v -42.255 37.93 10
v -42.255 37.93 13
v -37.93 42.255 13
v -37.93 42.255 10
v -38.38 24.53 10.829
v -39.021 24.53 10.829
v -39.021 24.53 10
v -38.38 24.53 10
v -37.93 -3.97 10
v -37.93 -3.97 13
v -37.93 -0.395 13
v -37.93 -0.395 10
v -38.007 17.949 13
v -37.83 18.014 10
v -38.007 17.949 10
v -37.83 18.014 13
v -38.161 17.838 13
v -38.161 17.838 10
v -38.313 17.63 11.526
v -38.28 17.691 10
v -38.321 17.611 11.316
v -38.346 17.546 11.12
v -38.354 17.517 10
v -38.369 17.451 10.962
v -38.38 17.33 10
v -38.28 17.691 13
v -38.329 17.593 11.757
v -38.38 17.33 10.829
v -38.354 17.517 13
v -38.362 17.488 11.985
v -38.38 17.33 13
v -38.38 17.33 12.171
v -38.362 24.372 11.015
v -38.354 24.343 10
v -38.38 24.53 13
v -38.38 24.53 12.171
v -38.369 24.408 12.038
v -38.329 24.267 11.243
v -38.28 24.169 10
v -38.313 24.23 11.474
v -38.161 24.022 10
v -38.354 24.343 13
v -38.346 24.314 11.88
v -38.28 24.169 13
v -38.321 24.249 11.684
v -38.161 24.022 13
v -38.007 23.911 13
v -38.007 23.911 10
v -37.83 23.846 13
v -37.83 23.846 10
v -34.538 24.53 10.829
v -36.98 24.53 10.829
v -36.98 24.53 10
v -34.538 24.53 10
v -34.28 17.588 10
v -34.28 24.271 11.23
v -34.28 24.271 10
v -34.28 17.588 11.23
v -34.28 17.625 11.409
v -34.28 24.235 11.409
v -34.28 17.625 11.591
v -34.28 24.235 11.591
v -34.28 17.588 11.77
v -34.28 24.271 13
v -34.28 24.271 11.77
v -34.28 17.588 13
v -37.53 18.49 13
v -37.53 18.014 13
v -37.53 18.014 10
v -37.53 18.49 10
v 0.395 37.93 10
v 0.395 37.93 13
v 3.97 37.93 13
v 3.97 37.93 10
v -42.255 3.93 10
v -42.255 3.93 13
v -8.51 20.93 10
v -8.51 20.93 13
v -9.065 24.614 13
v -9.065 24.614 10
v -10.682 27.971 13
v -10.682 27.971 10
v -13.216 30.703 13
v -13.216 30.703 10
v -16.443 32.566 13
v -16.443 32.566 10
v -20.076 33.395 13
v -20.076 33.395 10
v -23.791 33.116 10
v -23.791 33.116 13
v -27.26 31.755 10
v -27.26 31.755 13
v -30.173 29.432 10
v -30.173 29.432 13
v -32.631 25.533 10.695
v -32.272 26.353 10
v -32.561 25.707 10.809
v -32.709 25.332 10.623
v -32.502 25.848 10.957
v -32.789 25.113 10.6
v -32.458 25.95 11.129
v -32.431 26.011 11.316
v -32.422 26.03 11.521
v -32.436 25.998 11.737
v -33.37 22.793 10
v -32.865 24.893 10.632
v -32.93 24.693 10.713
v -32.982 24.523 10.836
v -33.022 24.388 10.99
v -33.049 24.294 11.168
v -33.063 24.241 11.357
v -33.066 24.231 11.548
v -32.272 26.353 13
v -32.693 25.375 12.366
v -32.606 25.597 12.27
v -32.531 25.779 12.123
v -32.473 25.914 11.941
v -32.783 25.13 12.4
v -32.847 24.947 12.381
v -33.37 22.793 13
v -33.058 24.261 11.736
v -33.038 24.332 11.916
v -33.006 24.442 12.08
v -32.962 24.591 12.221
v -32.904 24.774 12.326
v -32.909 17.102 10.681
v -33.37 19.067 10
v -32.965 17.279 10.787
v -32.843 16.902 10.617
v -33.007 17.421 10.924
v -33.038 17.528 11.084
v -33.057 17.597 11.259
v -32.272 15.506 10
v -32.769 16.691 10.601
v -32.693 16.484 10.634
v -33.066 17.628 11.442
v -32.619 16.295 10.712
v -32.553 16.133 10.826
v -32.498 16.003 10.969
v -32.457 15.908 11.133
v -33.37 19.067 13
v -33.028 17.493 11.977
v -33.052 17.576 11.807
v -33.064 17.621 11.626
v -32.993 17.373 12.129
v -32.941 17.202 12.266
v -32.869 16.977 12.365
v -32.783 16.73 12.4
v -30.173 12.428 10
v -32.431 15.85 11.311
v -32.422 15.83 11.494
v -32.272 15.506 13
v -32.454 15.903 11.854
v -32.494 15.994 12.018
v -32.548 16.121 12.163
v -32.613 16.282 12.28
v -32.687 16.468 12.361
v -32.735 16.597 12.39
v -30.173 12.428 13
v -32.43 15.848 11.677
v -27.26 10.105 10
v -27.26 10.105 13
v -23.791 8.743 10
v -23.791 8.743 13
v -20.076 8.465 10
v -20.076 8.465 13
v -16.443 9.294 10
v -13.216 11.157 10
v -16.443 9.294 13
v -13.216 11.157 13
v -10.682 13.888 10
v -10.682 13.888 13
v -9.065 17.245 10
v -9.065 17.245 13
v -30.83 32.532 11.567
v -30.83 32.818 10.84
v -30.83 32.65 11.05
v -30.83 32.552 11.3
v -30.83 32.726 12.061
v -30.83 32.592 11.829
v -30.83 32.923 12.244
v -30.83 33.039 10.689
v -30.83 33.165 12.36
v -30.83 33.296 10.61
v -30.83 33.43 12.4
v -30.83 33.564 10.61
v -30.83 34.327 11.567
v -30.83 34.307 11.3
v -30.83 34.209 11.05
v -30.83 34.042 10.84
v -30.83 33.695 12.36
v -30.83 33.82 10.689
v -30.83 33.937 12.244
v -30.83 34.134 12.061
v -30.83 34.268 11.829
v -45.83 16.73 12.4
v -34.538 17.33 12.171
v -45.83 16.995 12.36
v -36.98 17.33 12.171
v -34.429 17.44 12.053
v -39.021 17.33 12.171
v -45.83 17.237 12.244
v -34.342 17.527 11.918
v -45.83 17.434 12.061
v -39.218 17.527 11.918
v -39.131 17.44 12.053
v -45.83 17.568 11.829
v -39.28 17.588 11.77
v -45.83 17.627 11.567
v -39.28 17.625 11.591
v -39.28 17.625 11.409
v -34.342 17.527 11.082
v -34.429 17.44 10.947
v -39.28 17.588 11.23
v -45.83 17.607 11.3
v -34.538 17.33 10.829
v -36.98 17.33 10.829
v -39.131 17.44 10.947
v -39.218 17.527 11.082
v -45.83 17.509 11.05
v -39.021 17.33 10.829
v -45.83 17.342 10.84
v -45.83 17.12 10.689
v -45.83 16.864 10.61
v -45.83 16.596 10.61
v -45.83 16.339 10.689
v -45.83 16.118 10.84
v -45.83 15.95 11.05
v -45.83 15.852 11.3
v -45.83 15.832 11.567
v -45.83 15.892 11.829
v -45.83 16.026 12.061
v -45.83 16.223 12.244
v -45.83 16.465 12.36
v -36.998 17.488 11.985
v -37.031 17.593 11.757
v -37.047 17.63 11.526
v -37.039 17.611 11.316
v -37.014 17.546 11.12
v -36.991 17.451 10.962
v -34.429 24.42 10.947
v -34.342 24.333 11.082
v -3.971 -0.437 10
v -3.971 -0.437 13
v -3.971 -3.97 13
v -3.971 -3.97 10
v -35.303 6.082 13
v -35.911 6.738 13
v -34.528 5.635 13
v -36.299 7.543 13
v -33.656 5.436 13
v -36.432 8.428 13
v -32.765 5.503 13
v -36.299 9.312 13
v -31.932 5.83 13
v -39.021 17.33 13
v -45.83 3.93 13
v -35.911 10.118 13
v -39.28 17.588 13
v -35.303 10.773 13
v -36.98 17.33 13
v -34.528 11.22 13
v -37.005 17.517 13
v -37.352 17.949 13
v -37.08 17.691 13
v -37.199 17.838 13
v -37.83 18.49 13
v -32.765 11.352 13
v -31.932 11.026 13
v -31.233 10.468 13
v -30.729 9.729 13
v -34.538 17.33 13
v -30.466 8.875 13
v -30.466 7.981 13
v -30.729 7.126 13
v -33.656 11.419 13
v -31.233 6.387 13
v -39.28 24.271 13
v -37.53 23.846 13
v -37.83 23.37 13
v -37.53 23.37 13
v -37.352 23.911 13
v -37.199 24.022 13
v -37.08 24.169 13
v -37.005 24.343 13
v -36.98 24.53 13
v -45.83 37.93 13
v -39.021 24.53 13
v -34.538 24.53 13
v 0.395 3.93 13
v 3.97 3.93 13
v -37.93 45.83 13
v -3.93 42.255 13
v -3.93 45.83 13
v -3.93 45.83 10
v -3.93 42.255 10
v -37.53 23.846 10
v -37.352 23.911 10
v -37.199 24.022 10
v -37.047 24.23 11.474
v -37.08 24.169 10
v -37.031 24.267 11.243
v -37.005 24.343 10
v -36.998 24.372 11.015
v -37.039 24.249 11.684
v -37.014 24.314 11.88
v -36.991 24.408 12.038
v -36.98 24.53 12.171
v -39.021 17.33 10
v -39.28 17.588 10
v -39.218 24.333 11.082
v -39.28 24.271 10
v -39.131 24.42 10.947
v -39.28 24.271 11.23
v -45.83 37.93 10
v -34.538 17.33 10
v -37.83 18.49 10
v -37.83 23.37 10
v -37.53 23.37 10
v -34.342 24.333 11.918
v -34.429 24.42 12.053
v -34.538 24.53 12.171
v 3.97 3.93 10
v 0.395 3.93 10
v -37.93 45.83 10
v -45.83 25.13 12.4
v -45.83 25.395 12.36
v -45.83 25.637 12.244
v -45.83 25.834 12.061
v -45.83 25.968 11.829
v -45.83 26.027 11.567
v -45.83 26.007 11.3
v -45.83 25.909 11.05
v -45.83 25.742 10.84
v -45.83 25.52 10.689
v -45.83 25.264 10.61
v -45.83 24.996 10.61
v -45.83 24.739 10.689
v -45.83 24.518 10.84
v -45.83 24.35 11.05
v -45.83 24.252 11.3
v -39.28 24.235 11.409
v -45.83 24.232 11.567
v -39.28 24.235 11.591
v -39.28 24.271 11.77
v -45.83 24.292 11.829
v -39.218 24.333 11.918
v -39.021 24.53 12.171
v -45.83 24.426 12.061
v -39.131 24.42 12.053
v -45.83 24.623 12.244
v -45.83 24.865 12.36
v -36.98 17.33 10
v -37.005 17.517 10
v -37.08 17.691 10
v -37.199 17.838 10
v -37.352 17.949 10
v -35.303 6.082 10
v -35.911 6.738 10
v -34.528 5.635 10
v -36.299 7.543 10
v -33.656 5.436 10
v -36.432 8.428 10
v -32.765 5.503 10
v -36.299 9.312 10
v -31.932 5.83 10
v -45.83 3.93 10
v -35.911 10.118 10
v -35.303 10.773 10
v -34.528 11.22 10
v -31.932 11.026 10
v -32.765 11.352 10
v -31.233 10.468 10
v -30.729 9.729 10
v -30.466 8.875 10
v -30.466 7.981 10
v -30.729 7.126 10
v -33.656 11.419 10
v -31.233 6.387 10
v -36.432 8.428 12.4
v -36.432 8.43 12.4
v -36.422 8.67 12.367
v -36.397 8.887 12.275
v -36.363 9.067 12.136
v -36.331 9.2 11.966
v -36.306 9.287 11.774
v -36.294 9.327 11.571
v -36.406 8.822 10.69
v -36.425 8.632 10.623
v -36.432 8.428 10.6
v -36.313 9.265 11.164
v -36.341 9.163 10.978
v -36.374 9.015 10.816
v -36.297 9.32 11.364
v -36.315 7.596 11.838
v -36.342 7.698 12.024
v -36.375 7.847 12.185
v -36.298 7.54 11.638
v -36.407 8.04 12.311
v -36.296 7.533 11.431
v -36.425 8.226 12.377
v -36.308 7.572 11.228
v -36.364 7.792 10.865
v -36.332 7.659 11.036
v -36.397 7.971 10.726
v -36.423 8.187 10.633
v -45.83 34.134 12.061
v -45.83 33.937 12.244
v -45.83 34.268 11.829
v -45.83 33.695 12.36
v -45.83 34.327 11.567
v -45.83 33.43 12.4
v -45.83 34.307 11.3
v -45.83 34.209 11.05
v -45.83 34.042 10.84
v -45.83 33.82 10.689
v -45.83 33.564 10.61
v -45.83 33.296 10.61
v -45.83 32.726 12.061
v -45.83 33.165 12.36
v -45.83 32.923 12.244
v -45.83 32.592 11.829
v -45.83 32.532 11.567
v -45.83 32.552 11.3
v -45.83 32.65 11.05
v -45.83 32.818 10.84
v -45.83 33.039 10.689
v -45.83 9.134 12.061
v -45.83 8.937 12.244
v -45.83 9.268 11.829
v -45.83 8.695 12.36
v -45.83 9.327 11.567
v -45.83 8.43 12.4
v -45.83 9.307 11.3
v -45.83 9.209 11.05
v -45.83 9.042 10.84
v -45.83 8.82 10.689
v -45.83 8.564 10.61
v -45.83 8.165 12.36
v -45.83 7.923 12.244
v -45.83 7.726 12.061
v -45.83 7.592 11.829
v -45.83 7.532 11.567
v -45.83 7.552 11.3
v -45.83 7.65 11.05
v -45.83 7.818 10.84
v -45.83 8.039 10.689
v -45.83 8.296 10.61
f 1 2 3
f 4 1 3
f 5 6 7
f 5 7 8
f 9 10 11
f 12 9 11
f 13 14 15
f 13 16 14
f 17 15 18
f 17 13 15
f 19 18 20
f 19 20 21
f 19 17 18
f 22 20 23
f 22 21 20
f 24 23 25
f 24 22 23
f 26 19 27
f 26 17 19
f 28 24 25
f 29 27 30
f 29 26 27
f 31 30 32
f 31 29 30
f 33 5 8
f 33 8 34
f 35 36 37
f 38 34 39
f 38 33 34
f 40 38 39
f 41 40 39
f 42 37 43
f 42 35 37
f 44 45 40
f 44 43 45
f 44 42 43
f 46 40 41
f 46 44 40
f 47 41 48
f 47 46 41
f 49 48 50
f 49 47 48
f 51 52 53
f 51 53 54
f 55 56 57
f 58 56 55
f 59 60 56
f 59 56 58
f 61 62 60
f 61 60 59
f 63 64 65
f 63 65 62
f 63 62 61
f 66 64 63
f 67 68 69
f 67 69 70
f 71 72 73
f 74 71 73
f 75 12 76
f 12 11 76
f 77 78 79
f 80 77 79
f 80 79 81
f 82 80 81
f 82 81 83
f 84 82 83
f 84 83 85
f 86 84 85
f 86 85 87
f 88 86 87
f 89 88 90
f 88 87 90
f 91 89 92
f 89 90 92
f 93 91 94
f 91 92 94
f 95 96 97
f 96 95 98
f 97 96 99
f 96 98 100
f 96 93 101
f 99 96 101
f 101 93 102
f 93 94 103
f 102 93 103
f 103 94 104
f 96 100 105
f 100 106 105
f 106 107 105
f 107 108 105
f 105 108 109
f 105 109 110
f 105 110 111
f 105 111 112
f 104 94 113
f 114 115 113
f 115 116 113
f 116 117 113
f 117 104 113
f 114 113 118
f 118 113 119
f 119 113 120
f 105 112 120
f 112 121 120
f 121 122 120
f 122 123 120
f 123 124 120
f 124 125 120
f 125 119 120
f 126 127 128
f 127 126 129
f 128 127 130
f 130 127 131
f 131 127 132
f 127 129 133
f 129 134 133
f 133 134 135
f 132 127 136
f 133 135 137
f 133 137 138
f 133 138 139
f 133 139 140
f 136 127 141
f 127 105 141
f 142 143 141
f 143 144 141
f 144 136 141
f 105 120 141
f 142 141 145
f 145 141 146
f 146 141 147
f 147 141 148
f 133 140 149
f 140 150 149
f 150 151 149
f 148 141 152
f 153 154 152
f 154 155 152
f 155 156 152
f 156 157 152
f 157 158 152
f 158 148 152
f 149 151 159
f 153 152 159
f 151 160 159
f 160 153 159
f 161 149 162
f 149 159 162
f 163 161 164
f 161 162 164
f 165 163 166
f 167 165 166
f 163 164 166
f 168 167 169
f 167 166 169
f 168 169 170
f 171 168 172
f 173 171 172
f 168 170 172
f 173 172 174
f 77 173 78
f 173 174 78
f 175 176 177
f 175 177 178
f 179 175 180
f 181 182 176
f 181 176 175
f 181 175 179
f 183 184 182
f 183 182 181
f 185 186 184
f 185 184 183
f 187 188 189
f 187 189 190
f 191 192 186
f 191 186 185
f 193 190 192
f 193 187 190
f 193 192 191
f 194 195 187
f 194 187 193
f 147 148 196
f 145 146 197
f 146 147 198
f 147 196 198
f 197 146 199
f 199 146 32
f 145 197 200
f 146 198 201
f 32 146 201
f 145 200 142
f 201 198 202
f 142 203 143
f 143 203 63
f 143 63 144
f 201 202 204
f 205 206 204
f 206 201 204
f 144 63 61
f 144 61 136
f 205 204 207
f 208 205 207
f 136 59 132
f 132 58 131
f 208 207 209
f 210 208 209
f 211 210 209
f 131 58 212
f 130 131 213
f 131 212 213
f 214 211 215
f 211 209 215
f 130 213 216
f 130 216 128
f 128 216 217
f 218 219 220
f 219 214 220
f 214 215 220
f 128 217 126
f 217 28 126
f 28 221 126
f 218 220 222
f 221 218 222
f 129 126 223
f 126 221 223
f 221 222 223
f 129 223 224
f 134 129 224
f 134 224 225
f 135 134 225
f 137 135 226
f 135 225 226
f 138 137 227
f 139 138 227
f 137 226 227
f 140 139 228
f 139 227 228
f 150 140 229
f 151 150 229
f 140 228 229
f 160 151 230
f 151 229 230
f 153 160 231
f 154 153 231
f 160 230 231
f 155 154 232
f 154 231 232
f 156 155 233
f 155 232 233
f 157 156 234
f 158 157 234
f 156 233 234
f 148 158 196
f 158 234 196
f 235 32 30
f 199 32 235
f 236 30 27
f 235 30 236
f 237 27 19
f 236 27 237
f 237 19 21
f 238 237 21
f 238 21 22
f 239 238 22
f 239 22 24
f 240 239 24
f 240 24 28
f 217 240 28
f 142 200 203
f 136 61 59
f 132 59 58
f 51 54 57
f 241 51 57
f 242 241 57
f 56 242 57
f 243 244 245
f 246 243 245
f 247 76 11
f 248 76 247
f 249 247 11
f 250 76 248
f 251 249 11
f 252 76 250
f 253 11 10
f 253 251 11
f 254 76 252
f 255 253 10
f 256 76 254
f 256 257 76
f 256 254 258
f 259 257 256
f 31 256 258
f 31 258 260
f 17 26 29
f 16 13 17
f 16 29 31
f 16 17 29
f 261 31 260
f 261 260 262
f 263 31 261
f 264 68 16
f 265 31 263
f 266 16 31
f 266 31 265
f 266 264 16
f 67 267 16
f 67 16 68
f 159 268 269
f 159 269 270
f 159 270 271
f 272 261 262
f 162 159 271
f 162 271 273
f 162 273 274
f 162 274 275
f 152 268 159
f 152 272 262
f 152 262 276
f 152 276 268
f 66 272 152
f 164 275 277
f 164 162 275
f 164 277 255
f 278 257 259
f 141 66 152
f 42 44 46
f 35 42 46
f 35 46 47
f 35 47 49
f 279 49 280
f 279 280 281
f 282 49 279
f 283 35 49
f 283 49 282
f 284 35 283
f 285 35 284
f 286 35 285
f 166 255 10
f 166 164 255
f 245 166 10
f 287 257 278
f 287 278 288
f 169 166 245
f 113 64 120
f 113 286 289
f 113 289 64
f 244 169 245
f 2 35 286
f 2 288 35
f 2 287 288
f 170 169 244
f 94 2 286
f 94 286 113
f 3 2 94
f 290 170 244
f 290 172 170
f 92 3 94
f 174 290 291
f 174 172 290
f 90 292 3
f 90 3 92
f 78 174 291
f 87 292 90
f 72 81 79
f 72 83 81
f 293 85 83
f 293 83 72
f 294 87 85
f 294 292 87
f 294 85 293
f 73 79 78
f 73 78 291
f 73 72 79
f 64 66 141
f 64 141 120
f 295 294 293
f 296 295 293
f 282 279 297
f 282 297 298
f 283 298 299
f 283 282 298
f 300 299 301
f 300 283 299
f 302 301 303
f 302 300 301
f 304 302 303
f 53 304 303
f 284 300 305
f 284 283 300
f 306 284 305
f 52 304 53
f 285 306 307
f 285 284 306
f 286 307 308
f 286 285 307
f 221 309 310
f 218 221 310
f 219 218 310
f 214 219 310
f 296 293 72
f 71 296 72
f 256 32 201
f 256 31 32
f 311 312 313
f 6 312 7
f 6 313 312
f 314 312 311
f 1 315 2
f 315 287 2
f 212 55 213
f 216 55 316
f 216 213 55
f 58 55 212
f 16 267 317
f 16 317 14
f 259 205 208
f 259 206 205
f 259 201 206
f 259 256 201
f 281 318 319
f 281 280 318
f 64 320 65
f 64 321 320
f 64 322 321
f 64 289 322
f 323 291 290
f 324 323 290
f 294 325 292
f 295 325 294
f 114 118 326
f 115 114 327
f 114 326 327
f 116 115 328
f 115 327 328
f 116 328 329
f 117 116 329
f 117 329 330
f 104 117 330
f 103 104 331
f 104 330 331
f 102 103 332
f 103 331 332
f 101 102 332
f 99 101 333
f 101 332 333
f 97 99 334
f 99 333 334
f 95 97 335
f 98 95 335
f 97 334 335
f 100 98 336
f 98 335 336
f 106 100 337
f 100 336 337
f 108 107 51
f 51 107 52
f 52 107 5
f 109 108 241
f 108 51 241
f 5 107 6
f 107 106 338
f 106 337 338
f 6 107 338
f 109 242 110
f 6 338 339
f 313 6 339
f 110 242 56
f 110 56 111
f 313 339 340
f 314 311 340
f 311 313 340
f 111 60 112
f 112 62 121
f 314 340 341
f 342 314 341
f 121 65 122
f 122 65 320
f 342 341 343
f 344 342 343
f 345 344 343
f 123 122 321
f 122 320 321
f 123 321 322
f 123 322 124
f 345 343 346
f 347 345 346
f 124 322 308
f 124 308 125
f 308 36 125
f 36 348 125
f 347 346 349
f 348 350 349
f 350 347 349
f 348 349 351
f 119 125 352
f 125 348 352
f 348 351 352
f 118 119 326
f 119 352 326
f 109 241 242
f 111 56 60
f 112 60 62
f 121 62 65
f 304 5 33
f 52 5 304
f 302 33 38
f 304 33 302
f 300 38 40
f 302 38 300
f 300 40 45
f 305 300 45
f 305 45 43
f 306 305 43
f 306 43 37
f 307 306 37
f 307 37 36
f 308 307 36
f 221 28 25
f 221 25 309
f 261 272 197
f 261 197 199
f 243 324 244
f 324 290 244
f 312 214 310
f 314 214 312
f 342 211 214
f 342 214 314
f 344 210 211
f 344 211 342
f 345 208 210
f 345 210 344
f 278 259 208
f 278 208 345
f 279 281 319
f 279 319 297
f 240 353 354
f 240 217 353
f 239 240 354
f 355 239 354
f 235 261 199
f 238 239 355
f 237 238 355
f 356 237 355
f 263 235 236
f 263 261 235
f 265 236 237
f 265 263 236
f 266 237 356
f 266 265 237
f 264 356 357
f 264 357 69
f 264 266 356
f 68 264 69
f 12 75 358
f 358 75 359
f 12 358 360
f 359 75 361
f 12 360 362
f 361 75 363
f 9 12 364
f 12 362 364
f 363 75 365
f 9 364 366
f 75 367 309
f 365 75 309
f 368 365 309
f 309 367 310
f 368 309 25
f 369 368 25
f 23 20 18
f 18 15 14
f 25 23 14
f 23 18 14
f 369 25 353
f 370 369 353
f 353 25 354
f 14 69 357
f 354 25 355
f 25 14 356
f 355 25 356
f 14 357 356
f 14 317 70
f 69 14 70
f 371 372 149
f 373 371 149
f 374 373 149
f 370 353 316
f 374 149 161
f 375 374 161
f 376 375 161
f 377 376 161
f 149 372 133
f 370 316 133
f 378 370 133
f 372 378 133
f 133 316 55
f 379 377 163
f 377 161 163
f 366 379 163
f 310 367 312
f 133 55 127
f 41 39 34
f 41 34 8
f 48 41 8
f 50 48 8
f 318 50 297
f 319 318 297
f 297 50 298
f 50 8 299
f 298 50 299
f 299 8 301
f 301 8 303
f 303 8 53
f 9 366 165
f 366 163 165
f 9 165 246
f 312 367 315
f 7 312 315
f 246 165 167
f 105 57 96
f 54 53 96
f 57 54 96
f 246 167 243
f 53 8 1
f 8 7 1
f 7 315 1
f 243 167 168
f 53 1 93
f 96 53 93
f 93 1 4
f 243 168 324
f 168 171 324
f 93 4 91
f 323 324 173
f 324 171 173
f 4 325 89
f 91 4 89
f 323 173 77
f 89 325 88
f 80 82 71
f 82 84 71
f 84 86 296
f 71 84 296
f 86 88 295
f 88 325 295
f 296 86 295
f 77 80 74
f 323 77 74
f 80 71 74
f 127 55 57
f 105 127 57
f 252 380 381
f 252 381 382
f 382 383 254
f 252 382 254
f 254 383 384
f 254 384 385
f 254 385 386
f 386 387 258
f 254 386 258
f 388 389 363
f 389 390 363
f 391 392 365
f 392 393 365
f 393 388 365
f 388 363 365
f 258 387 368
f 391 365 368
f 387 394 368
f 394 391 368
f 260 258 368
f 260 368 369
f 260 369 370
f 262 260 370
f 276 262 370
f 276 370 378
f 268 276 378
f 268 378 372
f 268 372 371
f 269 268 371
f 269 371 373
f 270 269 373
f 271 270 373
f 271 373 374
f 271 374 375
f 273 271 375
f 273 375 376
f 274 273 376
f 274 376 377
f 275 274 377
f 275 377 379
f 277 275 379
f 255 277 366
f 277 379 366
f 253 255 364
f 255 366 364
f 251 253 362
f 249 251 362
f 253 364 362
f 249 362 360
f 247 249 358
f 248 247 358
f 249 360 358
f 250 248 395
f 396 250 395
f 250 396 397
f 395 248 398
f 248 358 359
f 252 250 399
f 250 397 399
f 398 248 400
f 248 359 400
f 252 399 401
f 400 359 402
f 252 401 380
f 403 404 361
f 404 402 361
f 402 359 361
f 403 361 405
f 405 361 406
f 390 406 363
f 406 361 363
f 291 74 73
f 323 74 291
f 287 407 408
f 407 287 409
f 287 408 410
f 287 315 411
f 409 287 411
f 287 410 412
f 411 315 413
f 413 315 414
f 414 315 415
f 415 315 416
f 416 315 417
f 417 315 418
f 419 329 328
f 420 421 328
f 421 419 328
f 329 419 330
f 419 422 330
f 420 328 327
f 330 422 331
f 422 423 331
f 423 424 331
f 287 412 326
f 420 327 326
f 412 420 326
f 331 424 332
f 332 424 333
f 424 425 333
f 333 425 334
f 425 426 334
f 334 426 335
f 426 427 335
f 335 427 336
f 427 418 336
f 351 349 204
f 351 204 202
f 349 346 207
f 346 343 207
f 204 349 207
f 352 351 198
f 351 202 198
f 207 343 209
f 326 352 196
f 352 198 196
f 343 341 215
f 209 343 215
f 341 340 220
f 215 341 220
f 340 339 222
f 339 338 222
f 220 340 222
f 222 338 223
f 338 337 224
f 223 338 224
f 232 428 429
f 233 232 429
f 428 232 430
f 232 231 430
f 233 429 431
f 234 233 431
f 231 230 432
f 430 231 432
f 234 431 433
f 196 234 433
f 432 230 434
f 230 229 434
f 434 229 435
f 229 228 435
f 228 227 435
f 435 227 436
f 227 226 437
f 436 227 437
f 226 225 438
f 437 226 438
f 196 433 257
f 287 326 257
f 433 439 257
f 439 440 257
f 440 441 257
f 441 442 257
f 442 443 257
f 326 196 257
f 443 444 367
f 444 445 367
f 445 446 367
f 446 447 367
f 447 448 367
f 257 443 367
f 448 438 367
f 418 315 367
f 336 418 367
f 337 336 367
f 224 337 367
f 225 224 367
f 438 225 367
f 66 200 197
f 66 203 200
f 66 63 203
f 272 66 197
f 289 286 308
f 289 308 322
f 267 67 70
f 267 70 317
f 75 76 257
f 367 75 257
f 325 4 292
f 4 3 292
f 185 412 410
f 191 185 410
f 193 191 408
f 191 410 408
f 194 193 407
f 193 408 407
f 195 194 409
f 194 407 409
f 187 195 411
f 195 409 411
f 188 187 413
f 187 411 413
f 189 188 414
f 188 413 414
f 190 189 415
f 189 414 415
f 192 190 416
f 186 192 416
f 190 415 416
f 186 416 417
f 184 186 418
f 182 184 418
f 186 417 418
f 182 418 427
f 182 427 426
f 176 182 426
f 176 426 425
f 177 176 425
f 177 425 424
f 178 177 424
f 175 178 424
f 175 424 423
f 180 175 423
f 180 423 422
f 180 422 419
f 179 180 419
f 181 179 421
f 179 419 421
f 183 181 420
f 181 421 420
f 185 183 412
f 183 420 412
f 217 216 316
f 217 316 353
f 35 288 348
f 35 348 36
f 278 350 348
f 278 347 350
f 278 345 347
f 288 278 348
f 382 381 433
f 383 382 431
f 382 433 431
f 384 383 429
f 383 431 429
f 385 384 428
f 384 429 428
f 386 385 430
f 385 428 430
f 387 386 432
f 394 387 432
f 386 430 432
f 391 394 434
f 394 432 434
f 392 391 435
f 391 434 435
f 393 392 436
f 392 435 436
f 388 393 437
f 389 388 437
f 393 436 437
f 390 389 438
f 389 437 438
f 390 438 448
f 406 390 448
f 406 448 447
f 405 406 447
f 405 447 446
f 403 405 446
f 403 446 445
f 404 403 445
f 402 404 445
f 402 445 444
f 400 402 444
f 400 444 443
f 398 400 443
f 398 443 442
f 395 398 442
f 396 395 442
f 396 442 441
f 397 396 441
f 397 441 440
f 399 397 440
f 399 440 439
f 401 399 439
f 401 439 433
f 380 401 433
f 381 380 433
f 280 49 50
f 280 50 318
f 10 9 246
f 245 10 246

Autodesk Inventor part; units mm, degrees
ref_plane "YZ Plane" through (0, 0, 0) normal (1, 0, 0) x (0, 1, 0)
ref_plane "XZ Plane" through (0, 0, 0) normal (0, 1, 0) x (-1, 0, 0)
ref_plane "Work Plane1" through (0, 0, 10) normal (0, 0, 1) x (1, 0, 0)
sketch "Sketch1" plane through (0, 0, 10) normal (0, 0, 1) x (1, 0, 0)
  line L0 (-4.0299, -0.3538) -> (-2.2322, 1.4439) construction
  arc A0 (-1.4439, 2.2322) -> (-2.2322, 1.4439) centre (-0.9299, 0.9299) ccw construction
  line L1 (-1.4439, 2.2322) -> (0.3538, 4.0299) construction
  line L2 (-37.8299, 42.8299) -> (-37.8299, 37.8299) construction
  line L3 (-37.8299, 37.8299) -> (-42.9208, 37.8299) construction
  line L4 (-37.8299, 42.2137) -> (-37.8299, 45.8299) construction
  line L5 (-37.8299, 45.8299) -> (-4.0299, 45.8299) construction
  line L6 (-4.0299, 45.8299) -> (-4.0299, 42.2137) construction
  line L7 (-4.0299, 4.0299) -> (0.3538, 4.0299) projected
  circle A1 centre (-20.9299, 20.9299) radius 17.5 projected
  line L8 (-20.9299, 58.9723) -> (17.1124, 20.9299) construction
  line L9 (17.1124, 20.9299) -> (-20.9299, -17.1124) construction
  line L10 (-20.9299, -17.1124) -> (-58.9723, 20.9299) construction
  line L11 (-58.9723, 20.9299) -> (-20.9299, 58.9723) construction
  line L12 (-20.9299, 58.9723) -> (-20.9299, -17.1124) construction
  line L13 (17.1124, 20.9299) -> (-58.9723, 20.9299) construction
  line L14 (-20.9299, 58.9723) -> (32.8701, 58.9723) construction
  line L15 (-43.4299, 43.4299) -> (1.5701, 43.4299) construction
  line L16 (1.5701, 43.4299) -> (1.5701, -1.5701) construction
  line L17 (1.5701, -1.5701) -> (-43.4299, -1.5701) construction
  line L18 (-43.4299, -1.5701) -> (-43.4299, 43.4299) construction
  line L19 (-43.4299, 43.4299) -> (1.5701, -1.5701) construction
  line L20 (1.5701, 43.4299) -> (-43.4299, -1.5701) construction
  line L21 (-43.4299, 5.3876) -> (-43.4299, 36.4723)
  line L22 (-43.4299, 36.4723) -> (-36.4723, 43.4299)
  line L23 (-36.4723, 43.4299) -> (-5.3876, 43.4299)
  line L24 (-5.3876, 43.4299) -> (1.5701, 36.4723)
  line L25 (1.5701, 36.4723) -> (1.5701, 5.3876)
  line L26 (1.5701, 5.3876) -> (-5.3876, -1.5701)
  line L27 (-5.3876, -1.5701) -> (-36.4723, -1.5701)
  line L28 (-36.4723, -1.5701) -> (-43.4299, 5.3876)
  line L29 (-4.0299, 42.2137) -> (-37.8299, 42.2137) projected
  line L30 (-4.0299, -0.3538) -> (-4.0299, 4.0299) projected
  circle A2 centre (-20.9299, 20.9299) radius 1.5
  line L31 (-10.9299, 10.9299) -> (-30.9299, 10.9299) construction
  line L32 (-30.9299, 10.9299) -> (-30.9299, 30.9299) construction
  line L33 (-30.9299, 30.9299) -> (-10.9299, 30.9299) construction
  line L34 (-10.9299, 30.9299) -> (-10.9299, 10.9299) construction
  line L35 (-10.9299, 10.9299) -> (-30.9299, 30.9299) construction
  line L36 (-30.9299, 10.9299) -> (-10.9299, 30.9299) construction
  circle A3 centre (-30.9299, 30.9299) radius 1.4
  circle A4 centre (-30.9299, 10.9299) radius 1.4
  circle A5 centre (-10.9299, 10.9299) radius 1.4
  line L37 (-45.8299, 37.8299) -> (-42.0723, 37.8299) construction
  line L38 (-42.1723, 37.7299) -> (-45.8299, 37.7299)
  line L39 (-45.8299, 37.7299) -> (-45.8299, 4.1299)
  line L40 (-45.8299, 4.1299) -> (-42.1723, 4.1299)
  line L41 (-42.1723, 4.1299) -> (-42.1723, 37.7299)
  line L42 (-45.8299, 4.0299) -> (-42.0723, 4.0299) construction
  line L43 (-45.8299, 37.8299) -> (-42.0723, 37.8299) projected
  line L44 (-37.7299, 45.8299) -> (-4.1299, 45.8299)
  line L45 (-4.1299, 45.8299) -> (-4.1299, 42.1723)
  line L46 (-4.1299, 42.1723) -> (-37.7299, 42.1723)
  line L47 (-37.7299, 42.1723) -> (-37.7299, 45.8299)
  line L48 (0.4701, 37.8299) -> (0.4701, 4.0299) construction
  line L49 (0.4701, 4.0299) -> (3.9701, 4.0299) construction
  line L50 (3.9701, 37.8299) -> (3.9701, 4.0299) construction
  line L51 (0.4701, 37.8299) -> (3.9701, 37.8299) construction
  line L52 (-45.8299, -3.9701) -> (-4.0299, -3.9701) construction
  line L53 (0.3124, 37.7299) -> (3.9701, 37.7299)
  line L54 (3.9701, 37.7299) -> (3.9701, 4.1299)
  line L55 (3.9701, 4.1299) -> (0.3124, 4.1299)
  line L56 (0.3124, 4.1299) -> (0.3124, 37.7299)
  line L57 (-4.1713, -0.3538) -> (-37.7299, -0.3538)
  line L58 (-37.7299, -0.3538) -> (-37.7299, -3.9701)
  line L59 (-37.7299, -3.9701) -> (-4.1713, -3.9701)
  line L60 (-4.1713, -3.9701) -> (-4.1713, -0.3538)
  point P0 (-37.8299, 4.0299)
  dimension "d18" = 53.8
  dimension "d19" = 45
  dimension "d20" = 53.8
  dimension "d21" = 45
  dimension "d22" = 45
  dimension "d30" = 20
  dimension "d31" = 20
  dimension "d32" = 2.8
  dimension "d33" = 2.8
  dimension "d34" = 2.8
  dimension "d35" = 3
  dimension "d36" = 0.1
  dimension "d37" = 0.1
  dimension "d38" = 0.1
  dimension "d39" = 0.1
extrude "Extrusion1" add sketch "Sketch1" along normal blind 3 contours L30 L26 L57 L28 L41 L22 L46 L24 L56 L7 | L7 L26 L30 | L56 L24 L25 L26 | L26 L25 L24 L53 L54 L55 | L60 L59 L58 L57 L28 L27 L26 | L26 L27 L28 L57 | L46 L22 L29 L24 | L24 L29 L45 | L40 L39 L38 L22 L21 L28 | L28 L21 L22 L41 | L29 L22 L23 L24 | L24 L23 L22 L29 L47 L44 L45 | L47 L29 L22 | A1 | A2 | A3 | A4 | A5
sketch "Skizze4" plane through (0, 0, 13) normal (0, 0, 1) x (1, 0, 0)
  line L0 (-37.7299, 42.1723) -> (-42.1723, 37.7299) projected
  line L1 (-42.1723, 37.7299) -> (-45.8299, 37.7299) projected
  line L2 (-45.8299, 37.7299) -> (-45.8299, 4.1299) construction
  line L3 (-45.8299, 4.1299) -> (-42.1723, 4.1299) projected
  line L4 (-42.1723, 4.1299) -> (-37.6885, -0.3538) projected
  line L5 (-37.6885, -0.3538) -> (-37.7299, -0.3538) projected
  line L6 (-37.7299, -0.3538) -> (-37.7299, -3.9701) projected
  line L7 (-37.7299, -3.9701) -> (-4.1713, -3.9701) construction
  line L8 (-4.1713, -3.9701) -> (-4.1713, -0.3538) projected
  line L9 (-4.1713, -0.3538) -> (0.3124, 4.1299) projected
  line L10 (0.3124, 4.1299) -> (3.9701, 4.1299) projected
  line L11 (3.9701, 4.1299) -> (3.9701, 37.7299) construction
  line L12 (3.9701, 37.7299) -> (0.3124, 37.7299) projected
  line L13 (0.3124, 37.7299) -> (-4.1299, 42.1723) projected
  line L14 (-4.1299, 42.1723) -> (-4.1299, 45.8299) projected
  line L15 (-4.1299, 45.8299) -> (-37.7299, 45.8299) construction
  line L16 (-37.7299, 45.8299) -> (-37.7299, 42.1723) projected
  line L17 (-37.9299, 46.0299) -> (-3.9299, 46.0299) construction
  line L18 (-3.9299, 46.0299) -> (-3.9299, 42.2551)
  line L19 (-3.9299, 42.2551) -> (0.3953, 37.9299)
  line L20 (0.3953, 37.9299) -> (4.1701, 37.9299)
  line L21 (4.1701, 37.9299) -> (4.1701, 3.9299) construction
  line L22 (4.1701, 3.9299) -> (0.3953, 3.9299)
  line L23 (0.3953, 3.9299) -> (-3.9713, -0.4367)
  line L24 (-3.9713, -0.4367) -> (-3.9713, -4.1701)
  line L25 (-3.9713, -4.1701) -> (-37.9299, -4.1701) construction
  line L26 (-37.9299, -4.1701) -> (-37.9299, -0.3953)
  line L27 (-37.9299, -0.3953) -> (-42.2551, 3.9299)
  line L28 (-42.2551, 3.9299) -> (-46.0299, 3.9299)
  line L29 (-46.0299, 3.9299) -> (-46.0299, 37.9299) construction
  line L30 (-46.0299, 37.9299) -> (-42.2551, 37.9299)
  line L31 (-42.2551, 37.9299) -> (-37.9299, 42.2551)
  line L32 (-37.9299, 42.2551) -> (-37.9299, 46.0299)
  line L33 (-45.8299, 37.7299) -> (-45.8299, 37.9299)
  line L34 (-4.1299, 45.8299) -> (-37.7299, 45.8299) projected
  line L35 (-37.7299, 45.8299) -> (-37.9299, 45.8299)
  line L36 (-4.1299, 45.8299) -> (-3.9299, 45.8299)
  line L37 (3.9701, 37.7299) -> (3.9701, 37.9299)
  line L38 (3.9701, 4.1299) -> (3.9701, 37.7299) projected
  line L39 (3.9701, 4.1299) -> (3.9701, 3.9299)
  line L40 (-4.1713, -3.9701) -> (-3.9713, -3.9701)
  line L41 (-37.7299, -3.9701) -> (-37.9299, -3.9701)
  line L42 (-45.8299, 4.1299) -> (-45.8299, 3.9299)
  point P0 (0, 0)
  dimension "d40" = 0.2
extrude "IM_offset" add sketch "Skizze4" against normal up to surface (3 mm away)
ref_plane "Arbeitsebene5" through (-20.9299, 3.9299, 10) normal (1, 0, 0) x (0, 0, -1)
ref_plane "Arbeitsebene6" through (-37.9299, 20.9299, 10) normal (0, 1, 0) x (1, 0, 0)
sketch "Skizze25" plane through (0, 0, 13) normal (0, 0, 1) x (1, 0, 0)
  arc A0 (-37.9299, 18.0899) -> (-38.4737, 17.4299) centre (-37.6799, 17.3299) ccw projected
  line L0 (-37.9299, 18.0899) -> (-37.9299, 18.5899) projected
  line L1 (-37.9299, 18.5899) -> (-37.4299, 18.5899) projected
  line L2 (-37.4299, 18.5899) -> (-37.4299, 18.0899) projected
  arc A1 (-36.8862, 17.4299) -> (-37.4299, 18.0899) centre (-37.6799, 17.3299) ccw projected
  line L3 (-36.8862, 17.4299) -> (-34.5799, 17.4299) projected
  line L4 (-34.5799, 17.4299) -> (-34.3799, 17.6299) projected
  line L5 (-34.3799, 17.6299) -> (-34.3799, 24.2299) projected
  line L6 (-34.3799, 24.2299) -> (-34.5799, 24.4299) projected
  line L7 (-34.5799, 24.4299) -> (-36.8862, 24.4299) projected
  arc A2 (-37.4299, 23.77) -> (-36.8862, 24.4299) centre (-37.6799, 24.5299) ccw projected
  line L8 (-37.4299, 23.77) -> (-37.4299, 23.27) projected
  line L9 (-37.4299, 23.27) -> (-37.9299, 23.27) projected
  line L10 (-37.9299, 23.27) -> (-37.9299, 23.77) projected
  arc A3 (-38.4737, 24.4299) -> (-37.9299, 23.77) centre (-37.6799, 24.5299) ccw projected
  line L11 (-38.4737, 24.4299) -> (-38.9799, 24.4299) projected
  line L12 (-38.9799, 24.4299) -> (-39.1799, 24.2299) projected
  line L13 (-39.1799, 24.2299) -> (-39.1799, 17.6299) projected
  line L14 (-39.1799, 17.6299) -> (-38.9799, 17.4299) projected
  line L15 (-38.9799, 17.4299) -> (-38.4737, 17.4299) projected
  line L16 (-34.2799, 24.2713) -> (-34.2799, 17.5885)
  line L17 (-34.2799, 17.5885) -> (-34.5385, 17.3299)
  line L18 (-34.5385, 17.3299) -> (-36.9799, 17.3299)
  arc A4 (-36.9799, 17.3299) -> (-37.5299, 18.0137) centre (-37.6799, 17.3299) ccw
  line L19 (-37.5299, 18.0137) -> (-37.5299, 18.4899)
  line L20 (-37.5299, 18.4899) -> (-37.8299, 18.4899)
  line L21 (-37.8299, 18.4899) -> (-37.8299, 18.0137)
  arc A5 (-37.8299, 18.0137) -> (-38.3799, 17.3299) centre (-37.6799, 17.3299) ccw
  line L22 (-38.3799, 17.3299) -> (-39.0213, 17.3299)
  line L23 (-39.0213, 17.3299) -> (-39.2799, 17.5885)
  line L24 (-39.2799, 17.5885) -> (-39.2799, 24.2713)
  line L25 (-39.2799, 24.2713) -> (-39.0213, 24.5299)
  line L26 (-39.0213, 24.5299) -> (-38.3799, 24.5299)
  arc A6 (-38.3799, 24.5299) -> (-37.8299, 23.8462) centre (-37.6799, 24.5299) ccw
  line L27 (-37.8299, 23.8462) -> (-37.8299, 23.37)
  line L28 (-37.8299, 23.37) -> (-37.5299, 23.37)
  line L29 (-37.5299, 23.37) -> (-37.5299, 23.8462)
  arc A7 (-37.5299, 23.8462) -> (-36.9799, 24.5299) centre (-37.6799, 24.5299) ccw
  line L30 (-36.9799, 24.5299) -> (-34.5385, 24.5299)
  line L31 (-34.5385, 24.5299) -> (-34.2799, 24.2713)
  circle A8 centre (-21.0099, 20.9299) radius 10.125 projected
  circle A9 centre (-21.0099, 20.9299) radius 12.5
  point P0 (0, 0)
  dimension "d150" = 0.1
  dimension "d151" = 25
extrude "Extrusion21" cut sketch "Skizze25" against normal blind 3 contours A0 L15 L14 L13 L12 L11 A3 L10 L9 L8 A2 L7 L6 L5 L4 L3 A1 L2 L1 L0 | L16 L17 L18 A4 L19 L20 L21 A5 L22 L23 L24 L25 L26 A6 L27 L28 L29 A7 L30 L31 | A8 | A9
sketch "Skizze26" plane through (-45.8299, 3.9299, 10) normal (-1, 0, 0) x (0, 0, 1)
  line L0 (0, 0) -> (0, 34) projected
  line L1 (3, 0) -> (0, 0) projected
  line L2 (3, 34) -> (3, 0) projected
  line L3 (3, 34) -> (0, 34) projected
  line L4 (3, 29.5) -> (0, 29.5) projected
  circle A0 centre (1.5, 29.5) radius 0.9
  line L5 (3, 4.5) -> (0, 4.5) projected
  circle A1 centre (1.5, 4.5) radius 0.9
  line L6 (36.97, 20.3) -> (-3.03, 20.3) projected
  line L7 (36.97, 13.7) -> (-3.03, 13.7) projected
  circle A2 centre (1.5, 21.2) radius 0.9
  circle A3 centre (1.5, 12.8) radius 0.9
  point P0 (-10, -3.9299)
  dimension "d154" = 1.8
  dimension "d155" = 1.8
  dimension "d158" = 1.8
  dimension "d159" = 1.8
extrude "Extrusion22" cut sketch "Skizze26" against normal blind 15 contours A3 | A1 L5 | L5 A1 | A2 | A0 L4 | L4 A0
sketch "Skizze27" plane through (0, 0, 10) normal (0, 0, -1) x (-1, 0, 0)
  arc A0 (36.9799, 24.5299) -> (37.5299, 23.8462) centre (37.6799, 24.5299) ccw projected
  line L0 (37.5299, 23.8462) -> (37.5299, 23.37) projected
  line L1 (37.5299, 23.37) -> (37.8299, 23.37) projected
  line L2 (37.8299, 23.37) -> (37.8299, 23.8462) projected
  arc A1 (37.8299, 23.8462) -> (38.3799, 24.5299) centre (37.6799, 24.5299) ccw projected
  line L3 (38.3799, 24.5299) -> (39.0213, 24.5299) projected
  line L4 (39.0213, 24.5299) -> (39.2799, 24.2713) projected
  line L5 (39.2799, 24.2713) -> (39.2799, 17.5885) projected
  line L6 (39.2799, 17.5885) -> (39.0213, 17.3299) projected
  line L7 (39.0213, 17.3299) -> (38.3799, 17.3299) projected
  arc A2 (38.3799, 17.3299) -> (37.8299, 18.0137) centre (37.6799, 17.3299) ccw projected
  line L8 (37.8299, 18.0137) -> (37.8299, 18.4899) projected
  line L9 (37.8299, 18.4899) -> (37.5299, 18.4899) projected
  line L10 (37.5299, 18.4899) -> (37.5299, 18.0137) projected
  arc A3 (37.5299, 18.0137) -> (36.9799, 17.3299) centre (37.6799, 17.3299) ccw projected
  line L11 (36.9799, 17.3299) -> (34.5385, 17.3299) projected
  line L12 (34.5385, 17.3299) -> (34.2799, 17.5885) projected
  line L13 (34.2799, 17.5885) -> (34.2799, 24.2713) projected
  line L14 (34.2799, 24.2713) -> (34.5385, 24.5299) projected
  line L15 (34.5385, 24.5299) -> (36.9799, 24.5299) projected
  circle A4 centre (21.0099, 20.9299) radius 12.5 projected
  line L16 (3.9713, -3.9701) -> (37.9299, -3.9701) projected
  line L17 (37.9299, -3.9701) -> (37.9299, -0.3953) projected
  line L18 (37.9299, -0.3953) -> (42.2551, 3.9299) projected
  line L19 (42.2551, 3.9299) -> (45.8299, 3.9299) projected
  line L20 (45.8299, 3.9299) -> (45.8299, 37.9299) projected
  line L21 (45.8299, 37.9299) -> (42.2551, 37.9299) projected
  line L22 (42.2551, 37.9299) -> (37.9299, 42.2551) projected
  line L23 (37.9299, 42.2551) -> (37.9299, 45.8299) projected
  line L24 (37.9299, 45.8299) -> (3.9299, 45.8299) projected
  line L25 (3.9299, 45.8299) -> (3.9299, 42.2551) projected
  line L26 (3.9299, 42.2551) -> (-0.3953, 37.9299) projected
  line L27 (-0.3953, 37.9299) -> (-3.9701, 37.9299) projected
  line L28 (-3.9701, 37.9299) -> (-3.9701, 3.9299) projected
  line L29 (-3.9701, 3.9299) -> (-0.3953, 3.9299) projected
  line L30 (-0.3953, 3.9299) -> (3.9713, -0.4367) projected
  line L31 (3.9713, -0.4367) -> (3.9713, -3.9701) projected
  line L32 (37.9799, 3.9599) -> (37.9799, 43.7799) projected
  line L33 (37.9799, 3.9599) -> (3.8799, 3.9599) projected
  circle A5 centre (33.4322, 8.4277) radius 3
  circle A6 centre (33.4322, 8.4277) radius 1.4
  point P0 (0, 0)
  point P1 (35.8514, 12.3014)
  dimension "d160" = 6
extrude "Extrusion23" cut sketch "Skizze27" against normal blind 15 contours A5 | A6
properties part number "20_Cube_Insert_lineartranlator_mgn7_base_v3"
